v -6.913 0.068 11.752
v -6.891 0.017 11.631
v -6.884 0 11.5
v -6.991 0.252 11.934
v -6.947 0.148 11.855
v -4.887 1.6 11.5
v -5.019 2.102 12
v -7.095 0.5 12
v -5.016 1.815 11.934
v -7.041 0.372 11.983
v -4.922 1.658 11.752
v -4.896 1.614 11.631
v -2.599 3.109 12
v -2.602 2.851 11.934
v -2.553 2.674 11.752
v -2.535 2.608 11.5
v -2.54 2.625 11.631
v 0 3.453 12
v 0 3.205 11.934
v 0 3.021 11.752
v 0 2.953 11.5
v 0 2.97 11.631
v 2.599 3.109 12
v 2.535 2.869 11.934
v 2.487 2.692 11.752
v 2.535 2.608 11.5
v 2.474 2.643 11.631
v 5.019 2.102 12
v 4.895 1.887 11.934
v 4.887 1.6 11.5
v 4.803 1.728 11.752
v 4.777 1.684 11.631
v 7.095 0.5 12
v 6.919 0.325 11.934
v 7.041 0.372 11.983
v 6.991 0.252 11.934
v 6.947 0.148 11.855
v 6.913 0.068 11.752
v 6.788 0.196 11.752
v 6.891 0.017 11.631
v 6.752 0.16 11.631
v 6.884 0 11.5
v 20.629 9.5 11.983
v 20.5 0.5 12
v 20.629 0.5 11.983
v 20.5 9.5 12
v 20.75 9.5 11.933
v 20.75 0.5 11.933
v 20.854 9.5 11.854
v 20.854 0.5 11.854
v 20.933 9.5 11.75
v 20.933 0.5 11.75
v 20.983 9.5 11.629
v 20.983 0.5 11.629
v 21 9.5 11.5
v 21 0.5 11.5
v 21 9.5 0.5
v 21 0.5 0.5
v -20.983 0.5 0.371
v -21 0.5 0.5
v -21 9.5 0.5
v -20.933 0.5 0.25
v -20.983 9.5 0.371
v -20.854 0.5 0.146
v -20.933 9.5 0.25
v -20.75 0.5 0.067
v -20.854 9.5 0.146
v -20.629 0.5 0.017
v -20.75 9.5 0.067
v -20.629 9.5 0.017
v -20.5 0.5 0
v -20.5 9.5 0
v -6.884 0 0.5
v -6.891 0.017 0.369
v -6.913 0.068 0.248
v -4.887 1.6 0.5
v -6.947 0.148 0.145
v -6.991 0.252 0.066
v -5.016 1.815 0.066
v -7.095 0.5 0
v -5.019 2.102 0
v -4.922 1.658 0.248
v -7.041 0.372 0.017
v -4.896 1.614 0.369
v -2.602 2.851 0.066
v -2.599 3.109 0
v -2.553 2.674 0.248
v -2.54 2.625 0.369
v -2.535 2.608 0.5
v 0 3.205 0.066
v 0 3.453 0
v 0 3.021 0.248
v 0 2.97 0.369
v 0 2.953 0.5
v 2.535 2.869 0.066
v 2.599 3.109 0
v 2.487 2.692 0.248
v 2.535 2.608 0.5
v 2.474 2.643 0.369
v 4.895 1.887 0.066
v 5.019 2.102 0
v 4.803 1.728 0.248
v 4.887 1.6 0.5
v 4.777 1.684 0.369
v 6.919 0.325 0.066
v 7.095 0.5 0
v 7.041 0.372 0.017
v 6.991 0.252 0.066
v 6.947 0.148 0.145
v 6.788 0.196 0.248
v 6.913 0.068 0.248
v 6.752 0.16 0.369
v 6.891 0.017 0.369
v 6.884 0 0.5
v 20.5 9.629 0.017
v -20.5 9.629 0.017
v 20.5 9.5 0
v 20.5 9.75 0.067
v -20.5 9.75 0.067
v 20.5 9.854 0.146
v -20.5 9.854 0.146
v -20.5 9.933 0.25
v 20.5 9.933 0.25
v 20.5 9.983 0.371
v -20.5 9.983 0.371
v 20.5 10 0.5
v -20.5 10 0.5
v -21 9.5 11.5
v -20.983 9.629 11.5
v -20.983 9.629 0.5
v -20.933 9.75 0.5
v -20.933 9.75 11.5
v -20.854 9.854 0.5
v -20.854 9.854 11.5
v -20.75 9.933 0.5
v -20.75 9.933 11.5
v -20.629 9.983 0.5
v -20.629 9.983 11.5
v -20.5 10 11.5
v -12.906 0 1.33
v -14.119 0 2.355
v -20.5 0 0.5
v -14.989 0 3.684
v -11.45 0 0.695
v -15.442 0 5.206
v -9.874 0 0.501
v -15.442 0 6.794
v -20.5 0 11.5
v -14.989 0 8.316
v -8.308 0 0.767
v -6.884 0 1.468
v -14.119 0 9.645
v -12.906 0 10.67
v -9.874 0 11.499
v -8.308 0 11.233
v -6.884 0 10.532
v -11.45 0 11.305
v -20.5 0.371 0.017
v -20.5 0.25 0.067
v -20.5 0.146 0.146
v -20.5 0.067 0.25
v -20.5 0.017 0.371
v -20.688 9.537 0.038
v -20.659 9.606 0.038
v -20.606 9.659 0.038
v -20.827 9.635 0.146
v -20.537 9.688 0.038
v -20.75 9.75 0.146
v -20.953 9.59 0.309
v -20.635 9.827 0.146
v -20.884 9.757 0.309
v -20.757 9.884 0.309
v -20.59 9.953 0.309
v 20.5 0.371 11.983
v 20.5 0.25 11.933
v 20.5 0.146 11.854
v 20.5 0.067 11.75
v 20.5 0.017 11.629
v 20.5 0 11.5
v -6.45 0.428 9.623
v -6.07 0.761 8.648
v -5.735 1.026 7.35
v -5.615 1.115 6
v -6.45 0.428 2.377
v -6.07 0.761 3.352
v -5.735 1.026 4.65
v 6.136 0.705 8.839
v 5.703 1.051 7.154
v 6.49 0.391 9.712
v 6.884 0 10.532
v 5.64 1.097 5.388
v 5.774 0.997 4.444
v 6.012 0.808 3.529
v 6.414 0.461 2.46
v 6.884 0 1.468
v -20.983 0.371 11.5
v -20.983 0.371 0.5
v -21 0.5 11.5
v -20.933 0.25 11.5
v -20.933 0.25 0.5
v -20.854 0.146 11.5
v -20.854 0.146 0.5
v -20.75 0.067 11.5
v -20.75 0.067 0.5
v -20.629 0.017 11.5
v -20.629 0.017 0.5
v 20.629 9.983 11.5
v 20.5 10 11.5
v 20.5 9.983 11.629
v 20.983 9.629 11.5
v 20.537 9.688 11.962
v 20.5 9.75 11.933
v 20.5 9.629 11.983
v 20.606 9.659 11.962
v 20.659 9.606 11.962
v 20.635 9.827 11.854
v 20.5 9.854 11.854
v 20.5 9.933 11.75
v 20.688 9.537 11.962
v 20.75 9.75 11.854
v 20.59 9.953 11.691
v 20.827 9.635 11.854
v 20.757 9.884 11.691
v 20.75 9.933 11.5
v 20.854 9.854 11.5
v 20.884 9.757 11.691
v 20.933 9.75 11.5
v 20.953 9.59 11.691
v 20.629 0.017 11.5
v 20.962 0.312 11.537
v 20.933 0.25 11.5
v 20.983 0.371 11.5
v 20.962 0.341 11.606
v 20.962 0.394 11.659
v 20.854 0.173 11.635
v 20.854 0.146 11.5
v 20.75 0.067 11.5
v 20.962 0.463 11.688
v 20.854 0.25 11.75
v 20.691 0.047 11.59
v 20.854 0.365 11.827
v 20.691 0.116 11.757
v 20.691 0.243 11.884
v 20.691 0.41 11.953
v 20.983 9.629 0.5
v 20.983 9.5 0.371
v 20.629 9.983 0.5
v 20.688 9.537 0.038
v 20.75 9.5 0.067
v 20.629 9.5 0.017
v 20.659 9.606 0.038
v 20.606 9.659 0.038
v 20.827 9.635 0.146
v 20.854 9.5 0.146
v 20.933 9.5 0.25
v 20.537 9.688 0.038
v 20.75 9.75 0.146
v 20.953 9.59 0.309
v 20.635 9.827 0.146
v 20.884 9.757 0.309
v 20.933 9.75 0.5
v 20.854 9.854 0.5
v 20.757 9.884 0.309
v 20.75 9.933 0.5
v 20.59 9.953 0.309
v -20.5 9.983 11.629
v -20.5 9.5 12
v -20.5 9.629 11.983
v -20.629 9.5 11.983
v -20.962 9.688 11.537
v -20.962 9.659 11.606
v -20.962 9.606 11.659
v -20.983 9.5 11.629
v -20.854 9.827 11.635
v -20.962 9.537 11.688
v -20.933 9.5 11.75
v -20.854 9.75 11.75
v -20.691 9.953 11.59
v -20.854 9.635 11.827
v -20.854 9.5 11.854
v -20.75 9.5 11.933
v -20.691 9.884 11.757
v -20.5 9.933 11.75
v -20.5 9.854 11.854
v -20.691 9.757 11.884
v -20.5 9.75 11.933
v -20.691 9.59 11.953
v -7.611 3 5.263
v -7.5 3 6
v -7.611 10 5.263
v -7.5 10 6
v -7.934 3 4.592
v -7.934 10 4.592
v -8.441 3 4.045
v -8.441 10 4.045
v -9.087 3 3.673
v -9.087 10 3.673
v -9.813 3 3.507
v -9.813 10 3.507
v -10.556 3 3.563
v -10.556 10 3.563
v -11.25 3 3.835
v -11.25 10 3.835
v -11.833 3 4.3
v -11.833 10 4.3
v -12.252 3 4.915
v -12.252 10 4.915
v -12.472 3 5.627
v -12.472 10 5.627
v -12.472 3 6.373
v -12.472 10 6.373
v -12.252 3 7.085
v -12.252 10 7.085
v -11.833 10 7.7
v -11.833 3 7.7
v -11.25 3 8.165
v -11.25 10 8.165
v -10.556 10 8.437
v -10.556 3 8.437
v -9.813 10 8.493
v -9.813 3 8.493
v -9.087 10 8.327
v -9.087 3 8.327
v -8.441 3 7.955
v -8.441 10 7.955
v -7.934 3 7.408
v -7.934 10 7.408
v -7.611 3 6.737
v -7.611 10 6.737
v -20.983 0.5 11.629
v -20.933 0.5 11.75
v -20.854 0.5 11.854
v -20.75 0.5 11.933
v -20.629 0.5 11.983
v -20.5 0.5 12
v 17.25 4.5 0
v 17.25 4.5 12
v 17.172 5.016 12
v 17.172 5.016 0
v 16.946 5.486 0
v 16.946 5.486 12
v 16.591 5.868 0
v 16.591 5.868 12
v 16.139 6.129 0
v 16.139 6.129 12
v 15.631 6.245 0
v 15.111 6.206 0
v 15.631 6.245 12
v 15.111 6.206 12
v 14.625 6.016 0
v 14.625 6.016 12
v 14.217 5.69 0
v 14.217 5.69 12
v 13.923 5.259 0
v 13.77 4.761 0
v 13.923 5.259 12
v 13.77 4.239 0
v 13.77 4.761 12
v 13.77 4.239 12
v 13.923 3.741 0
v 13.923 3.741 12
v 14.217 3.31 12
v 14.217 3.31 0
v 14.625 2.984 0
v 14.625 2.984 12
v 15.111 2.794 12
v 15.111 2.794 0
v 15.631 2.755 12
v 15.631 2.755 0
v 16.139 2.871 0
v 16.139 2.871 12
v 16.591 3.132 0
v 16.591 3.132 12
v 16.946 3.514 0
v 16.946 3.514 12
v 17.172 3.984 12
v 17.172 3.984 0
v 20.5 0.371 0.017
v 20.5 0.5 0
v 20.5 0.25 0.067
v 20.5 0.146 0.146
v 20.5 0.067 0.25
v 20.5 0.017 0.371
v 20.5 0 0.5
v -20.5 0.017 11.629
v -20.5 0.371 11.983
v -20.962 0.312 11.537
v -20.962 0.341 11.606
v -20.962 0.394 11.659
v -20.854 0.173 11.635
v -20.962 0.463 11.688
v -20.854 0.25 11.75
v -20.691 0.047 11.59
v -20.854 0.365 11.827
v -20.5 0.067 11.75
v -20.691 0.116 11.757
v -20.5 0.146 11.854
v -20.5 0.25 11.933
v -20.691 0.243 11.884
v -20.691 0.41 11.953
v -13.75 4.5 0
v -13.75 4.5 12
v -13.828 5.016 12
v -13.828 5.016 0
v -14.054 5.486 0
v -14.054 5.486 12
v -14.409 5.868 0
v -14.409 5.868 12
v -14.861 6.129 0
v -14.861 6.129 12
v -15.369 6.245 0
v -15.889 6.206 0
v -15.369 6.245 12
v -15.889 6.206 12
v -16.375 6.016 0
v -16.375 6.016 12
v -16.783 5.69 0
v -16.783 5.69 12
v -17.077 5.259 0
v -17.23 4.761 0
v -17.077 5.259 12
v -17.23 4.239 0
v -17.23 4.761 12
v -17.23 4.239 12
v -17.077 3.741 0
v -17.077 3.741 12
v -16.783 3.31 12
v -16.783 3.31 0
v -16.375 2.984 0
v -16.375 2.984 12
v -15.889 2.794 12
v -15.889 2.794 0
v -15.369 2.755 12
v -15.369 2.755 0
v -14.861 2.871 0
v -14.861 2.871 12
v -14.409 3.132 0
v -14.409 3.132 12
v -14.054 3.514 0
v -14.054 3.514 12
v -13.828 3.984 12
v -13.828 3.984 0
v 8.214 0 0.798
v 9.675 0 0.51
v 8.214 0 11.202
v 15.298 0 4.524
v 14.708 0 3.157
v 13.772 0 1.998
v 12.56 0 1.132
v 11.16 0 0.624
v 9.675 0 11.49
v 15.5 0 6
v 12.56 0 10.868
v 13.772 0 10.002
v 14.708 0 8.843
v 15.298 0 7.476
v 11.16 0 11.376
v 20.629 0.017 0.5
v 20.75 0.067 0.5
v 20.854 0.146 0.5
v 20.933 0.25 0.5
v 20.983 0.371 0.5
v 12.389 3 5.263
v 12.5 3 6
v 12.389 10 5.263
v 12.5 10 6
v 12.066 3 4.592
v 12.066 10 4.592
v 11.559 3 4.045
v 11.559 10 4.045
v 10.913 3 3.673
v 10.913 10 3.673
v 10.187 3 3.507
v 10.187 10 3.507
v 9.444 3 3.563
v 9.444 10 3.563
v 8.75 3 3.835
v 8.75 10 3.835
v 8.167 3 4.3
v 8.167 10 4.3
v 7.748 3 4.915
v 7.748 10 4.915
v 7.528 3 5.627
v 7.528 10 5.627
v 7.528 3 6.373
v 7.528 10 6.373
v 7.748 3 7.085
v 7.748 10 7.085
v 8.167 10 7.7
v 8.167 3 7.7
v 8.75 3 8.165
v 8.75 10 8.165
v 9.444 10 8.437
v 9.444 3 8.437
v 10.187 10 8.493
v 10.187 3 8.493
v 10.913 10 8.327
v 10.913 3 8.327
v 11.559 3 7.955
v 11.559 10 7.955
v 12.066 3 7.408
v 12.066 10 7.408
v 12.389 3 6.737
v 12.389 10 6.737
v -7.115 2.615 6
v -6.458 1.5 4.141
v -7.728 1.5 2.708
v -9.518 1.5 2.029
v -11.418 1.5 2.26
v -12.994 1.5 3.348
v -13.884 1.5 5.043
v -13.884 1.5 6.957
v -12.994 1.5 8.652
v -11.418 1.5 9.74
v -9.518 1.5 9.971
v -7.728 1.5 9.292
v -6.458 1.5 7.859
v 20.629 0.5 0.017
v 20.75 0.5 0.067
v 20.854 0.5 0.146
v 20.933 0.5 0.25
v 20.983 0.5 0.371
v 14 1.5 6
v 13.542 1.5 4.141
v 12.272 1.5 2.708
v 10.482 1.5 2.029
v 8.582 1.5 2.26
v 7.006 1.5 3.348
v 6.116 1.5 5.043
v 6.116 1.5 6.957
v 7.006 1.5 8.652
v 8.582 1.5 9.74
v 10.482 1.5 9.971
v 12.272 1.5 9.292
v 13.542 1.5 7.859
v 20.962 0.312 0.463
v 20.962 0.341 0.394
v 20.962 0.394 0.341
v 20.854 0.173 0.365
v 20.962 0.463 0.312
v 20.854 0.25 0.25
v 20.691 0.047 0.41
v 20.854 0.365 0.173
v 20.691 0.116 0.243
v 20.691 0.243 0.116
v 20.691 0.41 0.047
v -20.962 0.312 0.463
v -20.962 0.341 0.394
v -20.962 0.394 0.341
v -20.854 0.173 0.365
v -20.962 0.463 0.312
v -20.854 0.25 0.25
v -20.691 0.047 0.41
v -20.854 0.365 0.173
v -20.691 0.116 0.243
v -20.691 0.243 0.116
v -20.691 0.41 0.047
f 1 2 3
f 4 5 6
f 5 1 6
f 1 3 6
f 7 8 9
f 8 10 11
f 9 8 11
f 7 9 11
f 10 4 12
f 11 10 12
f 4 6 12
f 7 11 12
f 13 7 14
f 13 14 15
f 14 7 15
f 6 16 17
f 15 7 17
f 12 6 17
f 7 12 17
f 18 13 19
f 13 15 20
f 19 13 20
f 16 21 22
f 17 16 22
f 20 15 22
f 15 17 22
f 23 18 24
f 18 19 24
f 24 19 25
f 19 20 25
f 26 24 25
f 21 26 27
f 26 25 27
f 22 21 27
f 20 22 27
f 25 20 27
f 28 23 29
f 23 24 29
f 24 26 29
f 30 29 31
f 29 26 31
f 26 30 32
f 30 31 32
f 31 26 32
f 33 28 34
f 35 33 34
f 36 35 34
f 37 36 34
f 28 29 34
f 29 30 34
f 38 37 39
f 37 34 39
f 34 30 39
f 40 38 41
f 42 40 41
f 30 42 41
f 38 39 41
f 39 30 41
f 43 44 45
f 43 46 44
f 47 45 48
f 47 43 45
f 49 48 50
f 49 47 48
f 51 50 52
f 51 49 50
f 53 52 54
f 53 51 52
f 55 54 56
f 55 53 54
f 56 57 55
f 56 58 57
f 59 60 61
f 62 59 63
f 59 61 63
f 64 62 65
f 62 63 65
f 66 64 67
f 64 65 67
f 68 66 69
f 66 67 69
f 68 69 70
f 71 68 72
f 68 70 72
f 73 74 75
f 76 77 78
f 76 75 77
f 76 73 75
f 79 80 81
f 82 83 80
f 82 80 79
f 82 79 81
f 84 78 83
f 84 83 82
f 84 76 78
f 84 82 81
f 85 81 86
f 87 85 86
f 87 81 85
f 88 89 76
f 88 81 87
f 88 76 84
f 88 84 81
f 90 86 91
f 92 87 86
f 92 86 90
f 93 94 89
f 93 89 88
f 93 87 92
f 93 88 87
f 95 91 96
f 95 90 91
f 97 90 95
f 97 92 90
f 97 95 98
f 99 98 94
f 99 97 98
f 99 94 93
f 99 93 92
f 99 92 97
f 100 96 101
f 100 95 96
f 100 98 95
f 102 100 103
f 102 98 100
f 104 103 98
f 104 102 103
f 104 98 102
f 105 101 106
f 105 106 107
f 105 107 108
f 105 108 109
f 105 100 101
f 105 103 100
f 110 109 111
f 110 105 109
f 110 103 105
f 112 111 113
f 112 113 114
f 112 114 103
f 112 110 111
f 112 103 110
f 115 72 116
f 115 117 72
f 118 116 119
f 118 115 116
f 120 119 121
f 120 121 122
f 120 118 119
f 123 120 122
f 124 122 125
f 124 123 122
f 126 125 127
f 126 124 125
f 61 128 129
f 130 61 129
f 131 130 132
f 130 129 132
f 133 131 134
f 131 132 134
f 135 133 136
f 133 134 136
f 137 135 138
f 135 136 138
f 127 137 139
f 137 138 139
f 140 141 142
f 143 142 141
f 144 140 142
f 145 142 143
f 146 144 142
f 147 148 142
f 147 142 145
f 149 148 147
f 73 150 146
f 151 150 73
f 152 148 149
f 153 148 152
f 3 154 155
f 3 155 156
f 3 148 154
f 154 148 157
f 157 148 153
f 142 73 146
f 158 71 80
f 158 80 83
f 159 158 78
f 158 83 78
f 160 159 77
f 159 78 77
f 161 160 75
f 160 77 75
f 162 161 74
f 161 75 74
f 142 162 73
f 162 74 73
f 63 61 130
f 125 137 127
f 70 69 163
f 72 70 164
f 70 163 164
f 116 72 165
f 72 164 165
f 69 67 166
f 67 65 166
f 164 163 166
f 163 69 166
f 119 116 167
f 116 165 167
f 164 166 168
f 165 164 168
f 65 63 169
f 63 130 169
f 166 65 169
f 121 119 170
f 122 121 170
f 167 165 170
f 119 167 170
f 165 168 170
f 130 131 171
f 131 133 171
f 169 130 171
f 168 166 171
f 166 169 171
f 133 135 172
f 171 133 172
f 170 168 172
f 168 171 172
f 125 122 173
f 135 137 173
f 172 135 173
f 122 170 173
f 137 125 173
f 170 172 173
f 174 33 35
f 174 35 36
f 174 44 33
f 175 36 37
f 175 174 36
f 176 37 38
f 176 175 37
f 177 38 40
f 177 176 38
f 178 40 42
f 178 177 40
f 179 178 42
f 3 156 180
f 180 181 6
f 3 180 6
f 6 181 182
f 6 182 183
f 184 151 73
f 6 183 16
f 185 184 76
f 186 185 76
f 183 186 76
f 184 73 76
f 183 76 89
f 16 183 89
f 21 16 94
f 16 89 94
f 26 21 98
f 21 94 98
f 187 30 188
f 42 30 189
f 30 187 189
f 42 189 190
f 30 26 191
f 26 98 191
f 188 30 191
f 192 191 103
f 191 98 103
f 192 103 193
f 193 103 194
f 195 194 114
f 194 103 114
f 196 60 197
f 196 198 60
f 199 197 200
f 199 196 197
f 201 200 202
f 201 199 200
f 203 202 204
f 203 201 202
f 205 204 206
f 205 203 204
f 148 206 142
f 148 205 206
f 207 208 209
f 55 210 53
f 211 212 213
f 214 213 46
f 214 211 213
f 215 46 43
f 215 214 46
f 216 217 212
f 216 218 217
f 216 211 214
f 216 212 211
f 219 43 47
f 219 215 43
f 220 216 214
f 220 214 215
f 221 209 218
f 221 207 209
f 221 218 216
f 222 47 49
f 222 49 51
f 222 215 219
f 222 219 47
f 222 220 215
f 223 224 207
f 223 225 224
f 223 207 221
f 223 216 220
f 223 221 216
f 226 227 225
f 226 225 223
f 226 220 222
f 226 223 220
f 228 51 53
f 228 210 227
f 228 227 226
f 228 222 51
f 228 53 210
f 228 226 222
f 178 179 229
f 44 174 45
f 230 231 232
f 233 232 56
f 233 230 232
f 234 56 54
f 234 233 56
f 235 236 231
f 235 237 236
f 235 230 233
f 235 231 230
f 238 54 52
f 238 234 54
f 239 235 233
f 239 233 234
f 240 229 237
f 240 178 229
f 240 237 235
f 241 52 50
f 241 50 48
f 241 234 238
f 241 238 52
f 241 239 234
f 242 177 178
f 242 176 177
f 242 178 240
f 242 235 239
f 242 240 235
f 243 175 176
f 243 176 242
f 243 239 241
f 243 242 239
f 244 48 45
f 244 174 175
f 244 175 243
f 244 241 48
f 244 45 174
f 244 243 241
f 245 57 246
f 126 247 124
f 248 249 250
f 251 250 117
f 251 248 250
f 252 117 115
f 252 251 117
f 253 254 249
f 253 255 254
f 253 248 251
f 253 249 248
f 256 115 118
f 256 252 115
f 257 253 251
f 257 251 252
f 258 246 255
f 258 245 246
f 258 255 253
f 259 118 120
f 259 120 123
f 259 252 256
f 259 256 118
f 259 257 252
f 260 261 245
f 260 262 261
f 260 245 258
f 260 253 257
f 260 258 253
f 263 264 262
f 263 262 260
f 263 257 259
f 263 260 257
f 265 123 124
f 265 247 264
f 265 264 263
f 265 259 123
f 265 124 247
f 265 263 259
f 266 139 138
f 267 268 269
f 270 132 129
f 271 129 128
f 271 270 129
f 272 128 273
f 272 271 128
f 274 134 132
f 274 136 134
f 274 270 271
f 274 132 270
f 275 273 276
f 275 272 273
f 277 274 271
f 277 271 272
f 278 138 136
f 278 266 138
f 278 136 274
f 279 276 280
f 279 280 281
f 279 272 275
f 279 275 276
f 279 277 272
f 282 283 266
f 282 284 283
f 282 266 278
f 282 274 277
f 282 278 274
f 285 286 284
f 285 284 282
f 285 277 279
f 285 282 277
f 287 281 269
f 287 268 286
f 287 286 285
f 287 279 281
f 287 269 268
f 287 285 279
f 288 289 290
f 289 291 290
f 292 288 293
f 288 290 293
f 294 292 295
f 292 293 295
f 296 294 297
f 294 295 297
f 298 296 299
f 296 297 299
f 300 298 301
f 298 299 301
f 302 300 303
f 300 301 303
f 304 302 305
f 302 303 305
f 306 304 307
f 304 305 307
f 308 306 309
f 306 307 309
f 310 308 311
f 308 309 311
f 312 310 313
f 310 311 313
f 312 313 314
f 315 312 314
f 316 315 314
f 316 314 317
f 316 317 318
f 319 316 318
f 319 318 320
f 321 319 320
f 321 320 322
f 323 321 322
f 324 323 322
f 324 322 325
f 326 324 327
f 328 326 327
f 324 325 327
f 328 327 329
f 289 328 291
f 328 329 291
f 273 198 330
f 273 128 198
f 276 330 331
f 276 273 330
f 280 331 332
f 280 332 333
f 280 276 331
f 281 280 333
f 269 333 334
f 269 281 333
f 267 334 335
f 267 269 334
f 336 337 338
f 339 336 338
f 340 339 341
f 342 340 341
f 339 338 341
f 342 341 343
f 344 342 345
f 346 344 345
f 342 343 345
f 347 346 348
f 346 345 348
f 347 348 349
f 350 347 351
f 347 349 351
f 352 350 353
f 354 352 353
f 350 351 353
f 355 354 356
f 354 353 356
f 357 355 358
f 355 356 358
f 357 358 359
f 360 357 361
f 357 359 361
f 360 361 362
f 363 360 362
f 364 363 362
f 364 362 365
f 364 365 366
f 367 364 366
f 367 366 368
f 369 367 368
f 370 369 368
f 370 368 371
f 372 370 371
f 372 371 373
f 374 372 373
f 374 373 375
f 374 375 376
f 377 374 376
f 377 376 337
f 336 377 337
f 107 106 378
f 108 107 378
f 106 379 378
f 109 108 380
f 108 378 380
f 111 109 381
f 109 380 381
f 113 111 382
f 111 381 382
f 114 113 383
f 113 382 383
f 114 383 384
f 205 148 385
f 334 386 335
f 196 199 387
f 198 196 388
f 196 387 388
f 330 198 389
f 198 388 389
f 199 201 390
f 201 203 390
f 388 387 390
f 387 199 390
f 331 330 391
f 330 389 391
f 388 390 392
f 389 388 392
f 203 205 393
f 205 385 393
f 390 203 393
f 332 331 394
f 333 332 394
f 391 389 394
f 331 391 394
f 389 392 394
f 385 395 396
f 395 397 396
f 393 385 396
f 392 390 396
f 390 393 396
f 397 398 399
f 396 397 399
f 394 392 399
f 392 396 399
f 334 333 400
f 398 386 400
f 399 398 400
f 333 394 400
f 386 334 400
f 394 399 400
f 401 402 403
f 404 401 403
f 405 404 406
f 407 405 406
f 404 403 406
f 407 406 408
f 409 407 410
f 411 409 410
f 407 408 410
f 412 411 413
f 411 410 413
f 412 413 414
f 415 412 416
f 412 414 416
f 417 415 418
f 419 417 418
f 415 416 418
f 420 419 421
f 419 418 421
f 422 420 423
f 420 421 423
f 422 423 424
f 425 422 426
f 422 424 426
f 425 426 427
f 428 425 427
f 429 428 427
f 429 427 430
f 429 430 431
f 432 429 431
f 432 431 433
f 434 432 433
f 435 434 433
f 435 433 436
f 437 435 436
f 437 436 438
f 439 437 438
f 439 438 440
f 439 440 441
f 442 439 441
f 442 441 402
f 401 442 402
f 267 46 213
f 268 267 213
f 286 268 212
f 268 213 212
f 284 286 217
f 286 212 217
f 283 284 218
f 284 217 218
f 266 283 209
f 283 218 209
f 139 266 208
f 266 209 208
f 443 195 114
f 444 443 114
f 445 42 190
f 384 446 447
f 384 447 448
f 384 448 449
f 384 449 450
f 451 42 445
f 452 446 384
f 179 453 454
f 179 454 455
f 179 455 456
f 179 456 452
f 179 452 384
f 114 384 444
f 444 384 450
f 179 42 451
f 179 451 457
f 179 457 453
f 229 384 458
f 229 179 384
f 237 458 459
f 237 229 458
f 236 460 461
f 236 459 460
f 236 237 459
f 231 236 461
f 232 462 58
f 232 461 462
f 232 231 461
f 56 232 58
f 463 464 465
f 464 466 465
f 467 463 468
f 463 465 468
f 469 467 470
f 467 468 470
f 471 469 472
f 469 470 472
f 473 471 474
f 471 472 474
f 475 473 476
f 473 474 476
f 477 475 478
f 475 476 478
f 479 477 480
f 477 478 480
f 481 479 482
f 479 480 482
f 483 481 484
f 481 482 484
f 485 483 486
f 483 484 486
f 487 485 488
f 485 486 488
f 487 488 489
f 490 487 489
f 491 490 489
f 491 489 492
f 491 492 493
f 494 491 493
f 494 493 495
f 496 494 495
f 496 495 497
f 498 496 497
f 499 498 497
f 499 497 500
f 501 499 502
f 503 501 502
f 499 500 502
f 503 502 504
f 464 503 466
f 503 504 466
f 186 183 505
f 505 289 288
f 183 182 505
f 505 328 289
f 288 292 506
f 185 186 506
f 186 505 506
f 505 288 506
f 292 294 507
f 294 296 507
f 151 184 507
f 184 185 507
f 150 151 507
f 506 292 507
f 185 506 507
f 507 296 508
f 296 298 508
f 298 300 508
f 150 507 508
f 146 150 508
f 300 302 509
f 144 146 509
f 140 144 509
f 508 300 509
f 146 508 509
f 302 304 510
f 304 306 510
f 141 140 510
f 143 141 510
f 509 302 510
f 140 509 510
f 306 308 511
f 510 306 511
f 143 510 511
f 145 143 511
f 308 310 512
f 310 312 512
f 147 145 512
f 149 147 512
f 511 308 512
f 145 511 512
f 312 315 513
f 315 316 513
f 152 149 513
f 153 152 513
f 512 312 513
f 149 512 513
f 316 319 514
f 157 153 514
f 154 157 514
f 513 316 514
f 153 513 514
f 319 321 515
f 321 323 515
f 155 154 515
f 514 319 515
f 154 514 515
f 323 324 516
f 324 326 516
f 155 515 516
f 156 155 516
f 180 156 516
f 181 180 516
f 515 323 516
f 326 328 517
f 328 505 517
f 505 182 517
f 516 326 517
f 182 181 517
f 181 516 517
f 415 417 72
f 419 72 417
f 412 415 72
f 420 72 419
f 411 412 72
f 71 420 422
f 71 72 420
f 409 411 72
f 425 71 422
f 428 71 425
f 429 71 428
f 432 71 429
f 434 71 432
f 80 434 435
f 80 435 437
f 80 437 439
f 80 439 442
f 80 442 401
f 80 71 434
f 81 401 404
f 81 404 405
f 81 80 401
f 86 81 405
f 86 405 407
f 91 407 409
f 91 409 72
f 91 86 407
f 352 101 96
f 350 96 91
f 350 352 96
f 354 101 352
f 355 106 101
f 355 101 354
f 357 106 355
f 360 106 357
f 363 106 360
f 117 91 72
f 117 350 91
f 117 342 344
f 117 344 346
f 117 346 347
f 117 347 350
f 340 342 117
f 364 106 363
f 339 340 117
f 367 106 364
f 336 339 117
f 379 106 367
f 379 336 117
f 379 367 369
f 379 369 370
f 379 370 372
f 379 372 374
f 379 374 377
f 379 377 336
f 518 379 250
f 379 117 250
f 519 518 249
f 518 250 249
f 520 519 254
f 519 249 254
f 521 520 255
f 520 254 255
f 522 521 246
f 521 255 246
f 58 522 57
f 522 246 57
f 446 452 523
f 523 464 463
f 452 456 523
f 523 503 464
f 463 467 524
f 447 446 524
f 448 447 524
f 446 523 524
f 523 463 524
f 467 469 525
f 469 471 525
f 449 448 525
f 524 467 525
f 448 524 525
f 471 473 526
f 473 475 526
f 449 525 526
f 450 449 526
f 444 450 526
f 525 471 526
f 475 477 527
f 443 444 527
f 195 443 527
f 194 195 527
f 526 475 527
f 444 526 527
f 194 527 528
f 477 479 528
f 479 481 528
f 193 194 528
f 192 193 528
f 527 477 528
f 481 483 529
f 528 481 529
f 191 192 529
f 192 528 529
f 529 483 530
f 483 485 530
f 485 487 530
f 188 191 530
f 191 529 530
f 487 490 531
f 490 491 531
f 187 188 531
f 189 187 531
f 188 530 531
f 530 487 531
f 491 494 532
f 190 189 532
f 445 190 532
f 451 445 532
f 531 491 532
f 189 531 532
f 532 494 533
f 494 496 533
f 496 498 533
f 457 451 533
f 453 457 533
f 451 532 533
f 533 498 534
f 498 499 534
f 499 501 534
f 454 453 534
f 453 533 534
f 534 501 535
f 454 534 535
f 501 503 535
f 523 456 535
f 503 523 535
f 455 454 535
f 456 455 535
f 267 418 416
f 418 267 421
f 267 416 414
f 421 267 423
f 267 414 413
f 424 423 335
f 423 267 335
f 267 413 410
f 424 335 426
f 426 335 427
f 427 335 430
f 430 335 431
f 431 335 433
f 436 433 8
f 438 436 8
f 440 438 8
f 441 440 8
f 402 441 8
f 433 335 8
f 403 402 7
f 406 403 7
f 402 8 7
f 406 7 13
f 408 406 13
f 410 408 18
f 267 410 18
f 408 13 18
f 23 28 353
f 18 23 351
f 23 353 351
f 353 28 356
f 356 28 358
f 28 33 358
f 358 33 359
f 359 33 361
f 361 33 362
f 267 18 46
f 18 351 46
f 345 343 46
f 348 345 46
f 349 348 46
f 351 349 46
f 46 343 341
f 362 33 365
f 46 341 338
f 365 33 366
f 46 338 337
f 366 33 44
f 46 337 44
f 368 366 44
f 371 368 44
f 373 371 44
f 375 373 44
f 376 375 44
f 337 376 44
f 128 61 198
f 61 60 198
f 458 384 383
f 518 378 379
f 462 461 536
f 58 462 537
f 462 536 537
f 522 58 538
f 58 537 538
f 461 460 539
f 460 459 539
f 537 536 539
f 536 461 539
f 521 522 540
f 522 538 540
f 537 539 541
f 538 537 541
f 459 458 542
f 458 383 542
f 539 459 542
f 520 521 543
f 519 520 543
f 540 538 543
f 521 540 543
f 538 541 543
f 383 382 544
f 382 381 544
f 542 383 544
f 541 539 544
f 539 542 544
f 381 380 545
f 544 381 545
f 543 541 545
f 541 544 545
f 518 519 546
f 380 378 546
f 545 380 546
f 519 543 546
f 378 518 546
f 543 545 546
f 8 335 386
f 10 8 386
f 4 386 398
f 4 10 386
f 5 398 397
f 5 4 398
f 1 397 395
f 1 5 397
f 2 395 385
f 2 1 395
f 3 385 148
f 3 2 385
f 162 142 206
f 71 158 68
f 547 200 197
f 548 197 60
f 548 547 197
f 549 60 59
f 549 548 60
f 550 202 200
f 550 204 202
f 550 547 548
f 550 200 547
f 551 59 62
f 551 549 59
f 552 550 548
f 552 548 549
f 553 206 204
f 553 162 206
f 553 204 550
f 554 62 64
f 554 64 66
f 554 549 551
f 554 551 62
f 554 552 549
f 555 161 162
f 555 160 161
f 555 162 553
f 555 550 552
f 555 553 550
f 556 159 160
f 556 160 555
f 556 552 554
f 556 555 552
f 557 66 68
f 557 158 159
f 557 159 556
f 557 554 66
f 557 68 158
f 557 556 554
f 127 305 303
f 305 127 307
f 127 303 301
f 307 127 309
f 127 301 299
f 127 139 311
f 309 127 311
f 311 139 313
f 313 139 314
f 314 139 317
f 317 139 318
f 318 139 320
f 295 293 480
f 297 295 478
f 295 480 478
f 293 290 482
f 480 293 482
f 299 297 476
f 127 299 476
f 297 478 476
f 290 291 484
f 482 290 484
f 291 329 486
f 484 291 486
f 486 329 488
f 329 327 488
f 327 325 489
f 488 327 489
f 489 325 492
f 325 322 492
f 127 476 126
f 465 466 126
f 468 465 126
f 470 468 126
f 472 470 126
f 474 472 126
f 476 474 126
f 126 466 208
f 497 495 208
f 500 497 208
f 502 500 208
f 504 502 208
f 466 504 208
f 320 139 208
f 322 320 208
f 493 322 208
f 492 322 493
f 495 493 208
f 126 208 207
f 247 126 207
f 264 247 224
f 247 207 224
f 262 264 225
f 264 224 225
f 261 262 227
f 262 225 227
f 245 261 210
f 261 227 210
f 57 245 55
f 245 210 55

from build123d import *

# Parameters (mm, degrees)
CROQUIS1_W                              = 42
CROQUIS1_H                              = 12
SALIENTE_EXTRUIR1_DEPTH                 = 10
CORTAR_EXTRUIR1_DEPTH                   = 27.172504657
DI_METRO_DE_TALADRO_5_0_5_1_D           = 5
DI_METRO_DE_TALADRO_5_0_5_1_CSINK_D     = 10.999999995
DI_METRO_DE_TALADRO_5_0_5_1_CSINK_ANGLE = 90
DI_METRO_DE_TALADRO_3_5_3_5_1_D         = 3.5
REDONDEO1_R                             = 0.5


with BuildPart() as part:
    # Croquis1 → Saliente-Extruir1 (new body)
    with BuildSketch(Plane.XZ):
        with Locations((0, 6)):
            Rectangle(CROQUIS1_W, CROQUIS1_H)
    extrude(amount=-SALIENTE_EXTRUIR1_DEPTH)

    # Croquis2 → Cortar-Extruir1 (cut, through all)
    with BuildSketch(Plane(origin=(0, 0, 0), x_dir=(-1, 0, 0), z_dir=(0, 0, -1))):
        with BuildLine():
            Line((-6.883596498, 0), (6.883596498, 0))
            ThreePointArc((6.883596498, 0), (0, 2.952779272), (-6.883596498, 0))
        make_face()
    extrude(amount=-CORTAR_EXTRUIR1_DEPTH, mode=Mode.SUBTRACT)

    # Diámetro de taladro Ø5.0 (5)1 (through all)
    with Locations(Plane(origin=(0, 0, 0), x_dir=(-1, 0, 0), z_dir=(0, -1, 0))):
        with Locations((10, -6), (-10, -6)):
            CounterSinkHole(DI_METRO_DE_TALADRO_5_0_5_1_D / 2, DI_METRO_DE_TALADRO_5_0_5_1_CSINK_D / 2, counter_sink_angle=DI_METRO_DE_TALADRO_5_0_5_1_CSINK_ANGLE)

    # Diámetro de taladro Ø3.5 (3.5)1 (through all)
    with Locations(Plane(origin=(0, 0, 0), x_dir=(-1, 0, 0), z_dir=(0, 0, -1))):
        with Locations((15.5, 4.5), (-15.5, 4.5)):
            Hole(DI_METRO_DE_TALADRO_3_5_3_5_1_D / 2)

    # Redondeo1
    redondeo1_edges = [part.edges().sort_by_distance(p)[0] for p in [
        (21, 10, 6),
        (13.941798249, 0, 0),
        (-13.941798249, 0, 12),
        (0, 10, 12),
        (0, 2.952779272, 12),
        (0, 2.952779272, 0),
        (-21, 10, 6),
        (13.941798249, 0, 12),
        (21, 0, 6),
        (-13.941798249, 0, 0),
        (-21, 0, 6),
        (-21, 5, 12),
        (21, 5, 12),
        (21, 5, 0),
        (-21, 5, 0),
        (0, 10, 0),
    ]]
    fillet(redondeo1_edges, radius=REDONDEO1_R)


solid = part.part
